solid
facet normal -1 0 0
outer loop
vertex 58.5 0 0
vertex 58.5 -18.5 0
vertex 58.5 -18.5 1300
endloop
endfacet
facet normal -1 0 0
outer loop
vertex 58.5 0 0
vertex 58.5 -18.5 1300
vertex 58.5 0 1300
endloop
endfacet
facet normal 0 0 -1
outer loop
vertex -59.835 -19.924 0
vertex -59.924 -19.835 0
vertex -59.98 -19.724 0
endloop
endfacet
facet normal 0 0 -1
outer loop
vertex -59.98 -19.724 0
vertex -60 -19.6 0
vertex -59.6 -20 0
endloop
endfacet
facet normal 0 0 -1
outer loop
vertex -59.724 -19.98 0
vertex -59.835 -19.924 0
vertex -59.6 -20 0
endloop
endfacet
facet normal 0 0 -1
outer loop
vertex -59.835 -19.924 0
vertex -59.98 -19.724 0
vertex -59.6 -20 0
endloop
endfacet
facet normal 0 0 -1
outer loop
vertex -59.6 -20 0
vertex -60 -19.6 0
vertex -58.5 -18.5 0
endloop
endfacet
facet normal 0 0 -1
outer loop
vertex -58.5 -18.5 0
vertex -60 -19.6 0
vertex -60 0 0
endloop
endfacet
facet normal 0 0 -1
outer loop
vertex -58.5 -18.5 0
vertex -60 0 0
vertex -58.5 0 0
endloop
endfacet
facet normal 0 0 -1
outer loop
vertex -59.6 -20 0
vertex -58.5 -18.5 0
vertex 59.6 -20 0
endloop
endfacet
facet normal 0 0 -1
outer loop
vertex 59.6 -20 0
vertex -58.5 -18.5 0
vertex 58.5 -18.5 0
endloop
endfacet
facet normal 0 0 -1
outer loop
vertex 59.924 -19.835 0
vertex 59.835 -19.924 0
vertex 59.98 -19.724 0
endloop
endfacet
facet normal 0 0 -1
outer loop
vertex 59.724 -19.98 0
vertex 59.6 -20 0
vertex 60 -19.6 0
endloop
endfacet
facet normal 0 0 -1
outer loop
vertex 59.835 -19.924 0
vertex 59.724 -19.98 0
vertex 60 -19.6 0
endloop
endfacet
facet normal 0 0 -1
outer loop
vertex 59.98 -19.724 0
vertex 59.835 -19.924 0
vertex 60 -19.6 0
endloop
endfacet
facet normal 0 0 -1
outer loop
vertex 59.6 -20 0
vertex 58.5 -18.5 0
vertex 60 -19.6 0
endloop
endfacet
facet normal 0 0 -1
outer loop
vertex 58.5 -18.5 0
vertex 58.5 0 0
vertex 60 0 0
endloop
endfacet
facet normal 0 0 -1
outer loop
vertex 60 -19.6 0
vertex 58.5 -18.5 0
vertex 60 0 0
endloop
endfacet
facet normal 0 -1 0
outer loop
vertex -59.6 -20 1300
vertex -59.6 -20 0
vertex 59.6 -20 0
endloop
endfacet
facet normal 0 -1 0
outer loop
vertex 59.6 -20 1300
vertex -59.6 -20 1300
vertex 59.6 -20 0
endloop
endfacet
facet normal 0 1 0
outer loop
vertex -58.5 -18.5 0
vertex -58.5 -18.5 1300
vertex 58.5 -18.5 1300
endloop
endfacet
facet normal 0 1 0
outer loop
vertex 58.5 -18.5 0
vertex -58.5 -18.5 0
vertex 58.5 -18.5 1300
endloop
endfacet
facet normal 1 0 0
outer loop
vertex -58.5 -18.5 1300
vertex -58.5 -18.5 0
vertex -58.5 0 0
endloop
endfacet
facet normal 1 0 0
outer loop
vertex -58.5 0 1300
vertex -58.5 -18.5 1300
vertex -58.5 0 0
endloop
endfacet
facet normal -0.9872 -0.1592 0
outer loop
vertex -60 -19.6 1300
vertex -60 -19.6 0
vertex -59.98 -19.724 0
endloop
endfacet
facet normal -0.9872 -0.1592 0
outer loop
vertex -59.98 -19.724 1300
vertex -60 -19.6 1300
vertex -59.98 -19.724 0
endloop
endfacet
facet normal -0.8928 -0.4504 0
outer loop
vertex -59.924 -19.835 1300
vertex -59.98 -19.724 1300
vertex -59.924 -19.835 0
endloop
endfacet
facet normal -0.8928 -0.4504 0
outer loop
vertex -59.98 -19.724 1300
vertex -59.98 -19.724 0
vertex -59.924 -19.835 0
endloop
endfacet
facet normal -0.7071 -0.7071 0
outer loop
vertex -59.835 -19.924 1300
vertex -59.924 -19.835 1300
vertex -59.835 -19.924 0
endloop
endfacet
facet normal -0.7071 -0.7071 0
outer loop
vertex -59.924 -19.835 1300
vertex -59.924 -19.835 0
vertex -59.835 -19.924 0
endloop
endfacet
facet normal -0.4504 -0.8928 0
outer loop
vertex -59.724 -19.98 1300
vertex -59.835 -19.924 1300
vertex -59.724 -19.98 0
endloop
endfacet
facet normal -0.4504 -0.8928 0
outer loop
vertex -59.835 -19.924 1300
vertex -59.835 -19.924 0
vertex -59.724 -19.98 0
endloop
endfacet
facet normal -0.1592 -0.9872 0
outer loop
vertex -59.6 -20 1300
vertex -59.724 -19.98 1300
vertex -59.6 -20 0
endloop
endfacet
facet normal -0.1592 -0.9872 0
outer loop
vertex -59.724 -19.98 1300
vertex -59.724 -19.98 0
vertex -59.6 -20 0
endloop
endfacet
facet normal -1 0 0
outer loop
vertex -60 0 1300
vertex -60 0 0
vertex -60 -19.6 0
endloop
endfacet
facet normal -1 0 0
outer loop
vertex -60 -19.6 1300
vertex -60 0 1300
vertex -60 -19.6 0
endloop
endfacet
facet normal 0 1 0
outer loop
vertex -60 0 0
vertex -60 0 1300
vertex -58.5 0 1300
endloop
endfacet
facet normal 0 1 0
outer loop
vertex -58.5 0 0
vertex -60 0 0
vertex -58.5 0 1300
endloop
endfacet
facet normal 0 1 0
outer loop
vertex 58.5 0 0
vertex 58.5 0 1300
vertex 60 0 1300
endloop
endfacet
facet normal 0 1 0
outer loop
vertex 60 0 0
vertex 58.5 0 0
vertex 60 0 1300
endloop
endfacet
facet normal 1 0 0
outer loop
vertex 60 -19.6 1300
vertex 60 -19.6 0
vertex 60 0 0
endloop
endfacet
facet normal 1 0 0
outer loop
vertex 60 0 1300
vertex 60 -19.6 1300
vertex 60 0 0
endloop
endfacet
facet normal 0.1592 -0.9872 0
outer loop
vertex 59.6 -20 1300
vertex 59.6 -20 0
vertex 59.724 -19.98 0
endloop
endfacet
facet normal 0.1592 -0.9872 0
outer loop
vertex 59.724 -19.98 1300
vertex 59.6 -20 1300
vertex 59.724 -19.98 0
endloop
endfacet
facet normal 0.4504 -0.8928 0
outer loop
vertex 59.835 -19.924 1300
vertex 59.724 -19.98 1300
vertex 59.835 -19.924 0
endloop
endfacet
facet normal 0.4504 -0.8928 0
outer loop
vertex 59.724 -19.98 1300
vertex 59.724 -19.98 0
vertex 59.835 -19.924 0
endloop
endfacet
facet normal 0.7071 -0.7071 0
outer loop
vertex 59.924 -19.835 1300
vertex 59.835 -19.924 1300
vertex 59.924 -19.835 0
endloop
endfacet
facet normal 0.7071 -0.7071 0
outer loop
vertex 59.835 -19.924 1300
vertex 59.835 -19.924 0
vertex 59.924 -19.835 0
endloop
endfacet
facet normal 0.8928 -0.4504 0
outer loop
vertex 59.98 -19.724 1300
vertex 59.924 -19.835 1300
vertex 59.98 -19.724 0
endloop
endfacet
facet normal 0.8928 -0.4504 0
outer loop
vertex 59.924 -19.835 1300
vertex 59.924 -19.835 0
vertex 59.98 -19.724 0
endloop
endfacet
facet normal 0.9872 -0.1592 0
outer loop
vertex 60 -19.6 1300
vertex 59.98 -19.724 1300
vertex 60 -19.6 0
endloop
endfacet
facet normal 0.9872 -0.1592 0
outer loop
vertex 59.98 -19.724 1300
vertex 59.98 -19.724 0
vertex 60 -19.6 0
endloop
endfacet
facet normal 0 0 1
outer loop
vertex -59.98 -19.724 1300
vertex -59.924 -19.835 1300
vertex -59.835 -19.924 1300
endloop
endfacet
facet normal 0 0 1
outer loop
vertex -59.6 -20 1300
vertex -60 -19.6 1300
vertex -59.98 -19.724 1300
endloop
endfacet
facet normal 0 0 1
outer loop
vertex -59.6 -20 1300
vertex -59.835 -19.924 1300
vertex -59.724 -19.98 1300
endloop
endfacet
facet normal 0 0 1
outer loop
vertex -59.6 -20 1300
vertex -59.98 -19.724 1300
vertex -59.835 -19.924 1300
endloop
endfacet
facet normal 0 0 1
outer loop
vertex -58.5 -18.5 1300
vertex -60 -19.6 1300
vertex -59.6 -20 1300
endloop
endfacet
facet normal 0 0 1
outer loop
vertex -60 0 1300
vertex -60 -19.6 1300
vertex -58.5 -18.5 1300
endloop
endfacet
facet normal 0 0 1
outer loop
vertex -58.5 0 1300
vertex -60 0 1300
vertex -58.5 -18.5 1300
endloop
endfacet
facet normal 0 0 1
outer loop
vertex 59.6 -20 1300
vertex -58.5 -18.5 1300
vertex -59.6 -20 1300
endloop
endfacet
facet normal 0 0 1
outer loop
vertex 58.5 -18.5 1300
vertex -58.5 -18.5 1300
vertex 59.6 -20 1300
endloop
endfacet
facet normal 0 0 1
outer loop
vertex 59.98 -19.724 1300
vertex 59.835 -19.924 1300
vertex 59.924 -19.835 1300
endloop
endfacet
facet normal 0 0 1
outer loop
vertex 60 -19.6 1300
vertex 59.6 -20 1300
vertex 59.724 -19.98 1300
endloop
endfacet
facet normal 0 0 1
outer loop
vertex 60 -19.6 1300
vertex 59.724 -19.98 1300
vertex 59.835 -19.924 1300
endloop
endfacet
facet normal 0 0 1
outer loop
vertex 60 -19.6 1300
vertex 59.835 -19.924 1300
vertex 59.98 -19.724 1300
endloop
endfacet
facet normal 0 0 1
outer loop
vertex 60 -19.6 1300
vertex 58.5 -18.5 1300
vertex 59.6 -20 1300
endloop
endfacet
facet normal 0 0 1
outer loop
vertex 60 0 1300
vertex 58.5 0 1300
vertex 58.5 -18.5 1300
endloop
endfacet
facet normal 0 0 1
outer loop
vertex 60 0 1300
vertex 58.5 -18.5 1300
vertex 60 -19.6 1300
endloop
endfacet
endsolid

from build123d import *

# Parameters (mm, degrees)
F0_W     = 117
F0_H     = 37
F1_DEPTH = 1300
F3_DEPTH = 1300


with BuildPart() as f1:
    # F0 (on Top) → F1 (new body)
    with BuildSketch(Plane.XY):
        with BuildLine():
            ThreePointArc((60, 19.6), (59.882843, 19.882843), (59.6, 20))
            Line((59.6, 20), (-59.6, 20))
            ThreePointArc((-59.6, 20), (-59.882843, 19.882843), (-60, 19.6))
            Line((-60, 19.6), (-60, -19.6))
            ThreePointArc((-60, -19.6), (-59.882843, -19.882843), (-59.6, -20))
            Line((-59.6, -20), (59.6, -20))
            ThreePointArc((59.6, -20), (59.882843, -19.882843), (60, -19.6))
            Line((60, -19.6), (60, 19.6))
        make_face()
        Rectangle(F0_W, F0_H, mode=Mode.SUBTRACT)
    extrude(amount=F1_DEPTH)

    # F2 (on face) → F3 (cut)
    with BuildSketch(Plane.XY.offset(1300)):
        with BuildLine():
            Line((-60, 0), (-58.5, 0))
            Line((-58.5, 0), (-58.5, 18.5))
            Line((-58.5, 18.5), (58.5, 18.5))
            Line((58.5, 18.5), (58.5, 0))
            Line((58.5, 0), (60, 0))
            Line((60, 0), (60, 19.6))
            ThreePointArc((60, 19.6), (59.882843, 19.882843), (59.6, 20))
            Line((59.6, 20), (-59.6, 20))
            ThreePointArc((-59.6, 20), (-59.882843, 19.882843), (-60, 19.6))
            Line((-60, 19.6), (-60, 0))
        make_face()
    extrude(amount=-F3_DEPTH, mode=Mode.SUBTRACT)


solid = f1.part
